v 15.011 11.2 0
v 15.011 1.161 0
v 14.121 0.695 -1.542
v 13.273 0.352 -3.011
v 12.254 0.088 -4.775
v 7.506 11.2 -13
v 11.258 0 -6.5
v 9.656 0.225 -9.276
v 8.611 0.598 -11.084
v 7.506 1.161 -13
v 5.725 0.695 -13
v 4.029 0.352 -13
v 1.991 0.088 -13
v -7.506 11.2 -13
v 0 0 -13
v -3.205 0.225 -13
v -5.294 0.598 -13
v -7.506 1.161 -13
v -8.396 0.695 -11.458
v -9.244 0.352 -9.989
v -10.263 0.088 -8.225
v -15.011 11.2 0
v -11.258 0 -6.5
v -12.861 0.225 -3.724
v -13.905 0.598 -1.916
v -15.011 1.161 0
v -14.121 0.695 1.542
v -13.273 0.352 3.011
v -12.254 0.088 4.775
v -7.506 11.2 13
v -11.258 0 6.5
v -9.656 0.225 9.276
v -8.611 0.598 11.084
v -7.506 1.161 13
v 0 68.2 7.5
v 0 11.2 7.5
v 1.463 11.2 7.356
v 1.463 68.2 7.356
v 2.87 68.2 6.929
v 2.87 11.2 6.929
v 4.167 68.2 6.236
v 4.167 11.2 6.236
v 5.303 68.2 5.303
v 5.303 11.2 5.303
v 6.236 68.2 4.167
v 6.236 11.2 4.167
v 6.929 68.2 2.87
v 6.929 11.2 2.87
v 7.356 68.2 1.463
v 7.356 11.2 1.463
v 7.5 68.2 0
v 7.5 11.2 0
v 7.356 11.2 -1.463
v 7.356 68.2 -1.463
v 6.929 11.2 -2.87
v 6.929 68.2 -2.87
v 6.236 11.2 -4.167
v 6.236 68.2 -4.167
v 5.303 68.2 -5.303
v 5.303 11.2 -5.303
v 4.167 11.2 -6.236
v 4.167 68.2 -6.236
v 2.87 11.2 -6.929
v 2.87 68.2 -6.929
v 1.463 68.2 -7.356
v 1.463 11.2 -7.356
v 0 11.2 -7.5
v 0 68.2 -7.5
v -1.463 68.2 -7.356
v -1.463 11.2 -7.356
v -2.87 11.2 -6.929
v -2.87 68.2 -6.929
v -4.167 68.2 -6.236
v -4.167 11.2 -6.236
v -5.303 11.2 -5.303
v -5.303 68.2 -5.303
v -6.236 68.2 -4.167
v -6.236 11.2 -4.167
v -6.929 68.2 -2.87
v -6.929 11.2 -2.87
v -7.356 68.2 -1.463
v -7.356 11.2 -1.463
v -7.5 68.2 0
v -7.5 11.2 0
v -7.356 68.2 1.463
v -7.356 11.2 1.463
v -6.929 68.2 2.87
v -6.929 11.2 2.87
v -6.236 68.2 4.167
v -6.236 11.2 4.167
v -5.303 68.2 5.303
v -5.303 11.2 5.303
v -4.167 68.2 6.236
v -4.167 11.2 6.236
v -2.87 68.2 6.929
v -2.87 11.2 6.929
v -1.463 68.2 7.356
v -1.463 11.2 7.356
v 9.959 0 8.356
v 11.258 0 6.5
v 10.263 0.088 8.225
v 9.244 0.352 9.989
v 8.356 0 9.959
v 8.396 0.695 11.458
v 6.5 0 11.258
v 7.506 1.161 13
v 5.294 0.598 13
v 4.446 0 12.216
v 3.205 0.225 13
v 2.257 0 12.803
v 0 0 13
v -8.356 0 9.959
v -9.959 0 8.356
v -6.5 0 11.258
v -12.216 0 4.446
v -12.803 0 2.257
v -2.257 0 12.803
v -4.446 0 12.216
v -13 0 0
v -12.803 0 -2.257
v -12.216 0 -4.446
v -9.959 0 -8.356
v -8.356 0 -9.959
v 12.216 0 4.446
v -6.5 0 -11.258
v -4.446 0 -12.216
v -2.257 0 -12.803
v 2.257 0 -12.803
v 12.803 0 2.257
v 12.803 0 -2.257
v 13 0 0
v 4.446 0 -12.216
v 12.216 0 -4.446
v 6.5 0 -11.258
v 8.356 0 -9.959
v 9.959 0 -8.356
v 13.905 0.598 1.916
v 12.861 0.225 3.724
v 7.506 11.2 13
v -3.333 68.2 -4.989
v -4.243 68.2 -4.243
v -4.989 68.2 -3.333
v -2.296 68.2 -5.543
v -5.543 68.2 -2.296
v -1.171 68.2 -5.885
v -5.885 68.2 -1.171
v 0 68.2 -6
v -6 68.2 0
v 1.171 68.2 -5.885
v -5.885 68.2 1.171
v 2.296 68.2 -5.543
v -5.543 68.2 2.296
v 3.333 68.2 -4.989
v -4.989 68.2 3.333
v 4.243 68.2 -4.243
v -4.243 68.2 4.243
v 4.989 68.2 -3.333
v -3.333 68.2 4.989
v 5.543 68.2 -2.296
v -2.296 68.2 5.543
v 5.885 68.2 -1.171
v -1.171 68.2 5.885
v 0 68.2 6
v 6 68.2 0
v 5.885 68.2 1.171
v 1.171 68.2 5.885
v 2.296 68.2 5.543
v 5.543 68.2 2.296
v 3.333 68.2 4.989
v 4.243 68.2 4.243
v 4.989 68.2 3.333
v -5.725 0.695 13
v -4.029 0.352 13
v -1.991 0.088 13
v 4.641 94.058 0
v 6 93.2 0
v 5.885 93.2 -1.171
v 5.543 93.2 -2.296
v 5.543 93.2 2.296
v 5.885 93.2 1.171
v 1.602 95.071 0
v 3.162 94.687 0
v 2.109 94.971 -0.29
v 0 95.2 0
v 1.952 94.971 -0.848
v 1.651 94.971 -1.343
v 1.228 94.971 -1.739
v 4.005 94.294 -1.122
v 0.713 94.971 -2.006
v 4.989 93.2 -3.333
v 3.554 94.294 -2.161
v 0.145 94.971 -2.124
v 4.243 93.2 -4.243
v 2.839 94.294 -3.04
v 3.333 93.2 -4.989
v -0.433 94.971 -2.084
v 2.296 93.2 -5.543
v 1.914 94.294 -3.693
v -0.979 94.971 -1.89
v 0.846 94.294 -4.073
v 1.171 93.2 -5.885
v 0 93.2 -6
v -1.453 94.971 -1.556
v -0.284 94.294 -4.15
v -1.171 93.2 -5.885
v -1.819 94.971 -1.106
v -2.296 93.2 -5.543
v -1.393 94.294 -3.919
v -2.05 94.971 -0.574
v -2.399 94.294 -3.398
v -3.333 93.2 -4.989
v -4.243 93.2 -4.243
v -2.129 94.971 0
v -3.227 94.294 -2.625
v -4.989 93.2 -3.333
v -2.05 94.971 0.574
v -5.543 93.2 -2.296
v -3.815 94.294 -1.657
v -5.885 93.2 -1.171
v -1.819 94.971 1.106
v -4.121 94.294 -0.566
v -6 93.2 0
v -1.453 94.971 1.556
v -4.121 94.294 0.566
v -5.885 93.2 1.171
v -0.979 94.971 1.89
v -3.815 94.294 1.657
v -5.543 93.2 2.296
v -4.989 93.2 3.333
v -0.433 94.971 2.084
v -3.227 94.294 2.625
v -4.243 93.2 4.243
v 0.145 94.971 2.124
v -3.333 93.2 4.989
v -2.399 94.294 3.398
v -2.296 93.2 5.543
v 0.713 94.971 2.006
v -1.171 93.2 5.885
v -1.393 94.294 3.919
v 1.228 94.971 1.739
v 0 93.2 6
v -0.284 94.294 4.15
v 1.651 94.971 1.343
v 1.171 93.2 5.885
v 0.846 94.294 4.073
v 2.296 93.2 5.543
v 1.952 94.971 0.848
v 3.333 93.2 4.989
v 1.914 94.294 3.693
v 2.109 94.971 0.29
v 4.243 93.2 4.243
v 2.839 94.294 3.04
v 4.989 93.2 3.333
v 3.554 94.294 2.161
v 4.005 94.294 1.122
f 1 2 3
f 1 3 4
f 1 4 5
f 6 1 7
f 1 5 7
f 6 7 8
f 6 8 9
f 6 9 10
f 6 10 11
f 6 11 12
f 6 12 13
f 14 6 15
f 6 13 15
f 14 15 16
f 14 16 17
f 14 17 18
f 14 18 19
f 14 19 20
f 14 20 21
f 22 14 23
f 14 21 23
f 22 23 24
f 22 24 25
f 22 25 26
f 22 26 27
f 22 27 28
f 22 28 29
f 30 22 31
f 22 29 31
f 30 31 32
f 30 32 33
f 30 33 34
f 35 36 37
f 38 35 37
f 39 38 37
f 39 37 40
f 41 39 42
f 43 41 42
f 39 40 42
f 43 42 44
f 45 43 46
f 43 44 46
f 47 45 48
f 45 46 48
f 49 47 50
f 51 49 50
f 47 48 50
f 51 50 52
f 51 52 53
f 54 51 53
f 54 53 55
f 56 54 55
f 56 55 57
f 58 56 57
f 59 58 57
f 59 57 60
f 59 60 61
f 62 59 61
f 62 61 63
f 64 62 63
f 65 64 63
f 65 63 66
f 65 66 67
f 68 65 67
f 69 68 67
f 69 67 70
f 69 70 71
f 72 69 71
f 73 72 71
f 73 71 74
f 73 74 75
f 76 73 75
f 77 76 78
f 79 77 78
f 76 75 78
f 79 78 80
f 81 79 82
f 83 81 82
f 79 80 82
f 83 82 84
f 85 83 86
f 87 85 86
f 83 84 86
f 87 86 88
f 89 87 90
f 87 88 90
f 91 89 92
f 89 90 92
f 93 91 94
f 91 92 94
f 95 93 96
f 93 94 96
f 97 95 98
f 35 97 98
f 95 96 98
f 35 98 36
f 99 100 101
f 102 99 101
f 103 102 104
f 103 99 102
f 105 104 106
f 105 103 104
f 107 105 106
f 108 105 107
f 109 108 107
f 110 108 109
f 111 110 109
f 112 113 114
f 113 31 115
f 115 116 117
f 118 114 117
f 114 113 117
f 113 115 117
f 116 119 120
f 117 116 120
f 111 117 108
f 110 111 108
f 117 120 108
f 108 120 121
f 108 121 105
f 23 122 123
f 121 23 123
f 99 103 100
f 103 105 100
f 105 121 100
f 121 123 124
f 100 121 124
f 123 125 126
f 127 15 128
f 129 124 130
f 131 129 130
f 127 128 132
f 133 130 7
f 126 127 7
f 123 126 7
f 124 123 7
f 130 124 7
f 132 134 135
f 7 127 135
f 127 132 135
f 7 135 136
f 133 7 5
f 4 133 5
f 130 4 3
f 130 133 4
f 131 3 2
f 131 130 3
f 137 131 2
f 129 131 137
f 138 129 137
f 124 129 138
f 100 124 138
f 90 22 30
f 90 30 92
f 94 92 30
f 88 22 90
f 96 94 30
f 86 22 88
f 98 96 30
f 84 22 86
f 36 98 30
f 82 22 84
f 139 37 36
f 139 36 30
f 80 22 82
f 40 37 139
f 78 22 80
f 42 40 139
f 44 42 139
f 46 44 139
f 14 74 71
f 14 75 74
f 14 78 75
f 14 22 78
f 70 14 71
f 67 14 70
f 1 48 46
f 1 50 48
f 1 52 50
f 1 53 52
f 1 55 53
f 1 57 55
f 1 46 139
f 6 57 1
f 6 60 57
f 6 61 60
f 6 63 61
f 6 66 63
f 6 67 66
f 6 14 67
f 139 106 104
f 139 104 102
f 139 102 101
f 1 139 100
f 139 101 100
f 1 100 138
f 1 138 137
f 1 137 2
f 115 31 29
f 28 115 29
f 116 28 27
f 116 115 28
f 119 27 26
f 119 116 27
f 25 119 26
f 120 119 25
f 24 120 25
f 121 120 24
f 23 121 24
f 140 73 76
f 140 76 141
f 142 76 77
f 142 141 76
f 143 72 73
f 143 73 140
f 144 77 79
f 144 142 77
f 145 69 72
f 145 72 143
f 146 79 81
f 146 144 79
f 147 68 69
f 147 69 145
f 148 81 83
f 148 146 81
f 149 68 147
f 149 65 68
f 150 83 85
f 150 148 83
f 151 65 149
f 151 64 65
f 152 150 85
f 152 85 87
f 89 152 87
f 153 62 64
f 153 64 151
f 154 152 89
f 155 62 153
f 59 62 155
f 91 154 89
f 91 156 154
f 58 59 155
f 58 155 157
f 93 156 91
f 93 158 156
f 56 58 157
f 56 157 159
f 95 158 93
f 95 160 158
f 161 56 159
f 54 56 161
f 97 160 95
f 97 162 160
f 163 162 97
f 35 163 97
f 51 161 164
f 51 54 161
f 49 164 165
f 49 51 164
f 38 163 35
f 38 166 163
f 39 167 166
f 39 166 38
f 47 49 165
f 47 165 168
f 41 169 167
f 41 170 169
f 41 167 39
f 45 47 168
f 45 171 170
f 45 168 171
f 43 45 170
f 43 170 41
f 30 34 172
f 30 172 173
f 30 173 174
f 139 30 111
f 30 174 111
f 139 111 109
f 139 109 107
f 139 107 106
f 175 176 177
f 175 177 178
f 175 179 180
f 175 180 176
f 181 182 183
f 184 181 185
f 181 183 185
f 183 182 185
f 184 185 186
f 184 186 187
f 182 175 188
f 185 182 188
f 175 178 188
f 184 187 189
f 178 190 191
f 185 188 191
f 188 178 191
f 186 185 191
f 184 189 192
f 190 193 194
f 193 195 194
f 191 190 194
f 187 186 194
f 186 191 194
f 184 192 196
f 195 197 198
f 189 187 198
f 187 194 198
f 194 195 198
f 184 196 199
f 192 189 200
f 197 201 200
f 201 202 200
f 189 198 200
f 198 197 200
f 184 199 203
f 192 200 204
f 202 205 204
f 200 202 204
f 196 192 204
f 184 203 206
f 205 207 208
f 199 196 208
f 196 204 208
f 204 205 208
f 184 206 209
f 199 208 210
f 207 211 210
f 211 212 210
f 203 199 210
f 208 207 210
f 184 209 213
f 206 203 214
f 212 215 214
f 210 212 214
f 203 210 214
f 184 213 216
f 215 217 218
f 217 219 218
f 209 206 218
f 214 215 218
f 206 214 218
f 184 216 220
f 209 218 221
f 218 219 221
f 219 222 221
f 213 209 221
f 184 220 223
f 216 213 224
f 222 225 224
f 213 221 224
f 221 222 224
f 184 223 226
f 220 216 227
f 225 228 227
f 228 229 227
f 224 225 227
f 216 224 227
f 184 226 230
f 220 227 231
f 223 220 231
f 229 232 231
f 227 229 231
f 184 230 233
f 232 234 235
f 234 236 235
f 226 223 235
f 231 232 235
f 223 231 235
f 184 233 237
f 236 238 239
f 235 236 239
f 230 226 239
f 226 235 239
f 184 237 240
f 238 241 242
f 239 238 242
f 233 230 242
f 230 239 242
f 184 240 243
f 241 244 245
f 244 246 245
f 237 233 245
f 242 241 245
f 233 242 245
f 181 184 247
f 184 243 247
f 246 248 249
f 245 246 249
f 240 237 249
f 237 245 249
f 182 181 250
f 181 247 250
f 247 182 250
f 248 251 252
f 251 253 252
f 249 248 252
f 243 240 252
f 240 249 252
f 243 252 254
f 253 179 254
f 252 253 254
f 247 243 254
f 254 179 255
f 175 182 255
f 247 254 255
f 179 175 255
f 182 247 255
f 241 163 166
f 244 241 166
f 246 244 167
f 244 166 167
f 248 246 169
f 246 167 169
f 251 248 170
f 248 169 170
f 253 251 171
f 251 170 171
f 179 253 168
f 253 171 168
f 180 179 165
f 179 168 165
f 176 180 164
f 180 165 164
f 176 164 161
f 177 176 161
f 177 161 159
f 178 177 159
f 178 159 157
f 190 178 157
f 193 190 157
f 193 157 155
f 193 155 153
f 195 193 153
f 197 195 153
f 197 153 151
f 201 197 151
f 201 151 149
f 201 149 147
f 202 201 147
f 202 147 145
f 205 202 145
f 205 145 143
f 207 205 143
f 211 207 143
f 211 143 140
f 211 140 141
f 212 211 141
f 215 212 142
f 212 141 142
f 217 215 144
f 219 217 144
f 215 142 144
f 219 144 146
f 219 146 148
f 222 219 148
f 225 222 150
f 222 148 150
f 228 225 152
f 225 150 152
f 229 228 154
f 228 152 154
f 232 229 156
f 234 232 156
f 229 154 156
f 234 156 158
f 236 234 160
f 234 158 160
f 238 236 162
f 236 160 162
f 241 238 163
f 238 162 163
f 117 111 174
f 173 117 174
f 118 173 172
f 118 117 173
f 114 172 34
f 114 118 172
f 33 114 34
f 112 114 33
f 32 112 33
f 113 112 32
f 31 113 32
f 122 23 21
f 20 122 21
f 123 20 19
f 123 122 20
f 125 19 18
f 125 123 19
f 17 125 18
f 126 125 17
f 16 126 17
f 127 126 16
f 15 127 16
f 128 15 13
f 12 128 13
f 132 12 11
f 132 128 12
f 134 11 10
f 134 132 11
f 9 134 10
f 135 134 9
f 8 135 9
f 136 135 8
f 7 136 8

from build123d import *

# Parameters (mm, degrees)
SKETCH1_R           = 7.5
BOSS_EXTRUDE1_DEPTH = 11.2
SKETCH1_3_R         = 7.5
SKETCH1_3_R_2       = 6
BOSS_EXTRUDE2_DEPTH = 68.2
SKETCH1_4_R         = 6
BOSS_EXTRUDE3_DEPTH = 93.2
SKETCH4_OUTSIDE_W   = 338.072
SKETCH4_OUTSIDE_H   = 334.05
SKETCH4_OUTSIDE_R   = 13
CUT_EXTRUDE1_DEPTH  = 82.5
CUT_EXTRUDE1_DRAFT  = -60


with BuildPart() as part:
    # Sketch1 → Boss-Extrude1 (new body)
    with BuildSketch(Plane(origin=(0, 0, 0), x_dir=(1, 0, 0), z_dir=(0, 1, 0))):
        Polygon((15.011106999, 0), (7.505553499, 13), (-7.505553499, 13), (-15.011106999, 0), (-7.505553499, -13), (7.505553499, -13), align=None)
        with Locations(Location((0, 0, 0), (0, 0, 270))):
            Circle(SKETCH1_R, mode=Mode.SUBTRACT)
    extrude(amount=BOSS_EXTRUDE1_DEPTH)

    # Sketch1<3> → Boss-Extrude2 (add)
    with BuildSketch(Plane(origin=(0, 0, 0), x_dir=(1, 0, 0), z_dir=(0, 1, 0))):
        with Locations(Location((0, 0, 0), (0, 0, 270))):
            Circle(SKETCH1_3_R)
        with Locations(Location((0, 0, 0), (0, 0, 270))):
            Circle(SKETCH1_3_R_2, mode=Mode.SUBTRACT)
    extrude(amount=BOSS_EXTRUDE2_DEPTH)

    # Sketch1<4> → Boss-Extrude3 (add)
    with BuildSketch(Plane(origin=(0, 0, 0), x_dir=(1, 0, 0), z_dir=(0, 1, 0))):
        with Locations(Location((0, 0, 0), (0, 0, 270))):
            Circle(SKETCH1_4_R)
    extrude(amount=BOSS_EXTRUDE3_DEPTH)


with BuildPart() as cut_extrude1_tool:
    # Sketch4 outside → Cut-Extrude1 (with draft: the straight prism first)
    with BuildSketch(Plane.XZ):
        Rectangle(SKETCH4_OUTSIDE_W, SKETCH4_OUTSIDE_H)
        Circle(SKETCH4_OUTSIDE_R, mode=Mode.SUBTRACT)
    extrude(amount=-CUT_EXTRUDE1_DEPTH)
    # Cut-Extrude1: the draft: its side faces are tilted about the plane it starts from
    cut_extrude1_sides = [cut_extrude1_tool.faces().sort_by_distance(p)[0] for p in [
        (0, 41.25, -167.025),
        (169.036, 41.25, 0),
        (0, 41.25, 167.025),
        (-169.036, 41.25, 0),
        (-13, 41.25, 0),
    ]]
    draft(cut_extrude1_sides, Plane.XZ, CUT_EXTRUDE1_DRAFT)


with BuildPart() as part_1:
    add(part.part)

    # Cut-Extrude1: cut by cut_extrude1_tool
    add(cut_extrude1_tool.part, mode=Mode.SUBTRACT)

    # Sketch2 → Revolve2 (revolve)
    with BuildSketch(Plane.XY, mode=Mode.PRIVATE) as revolve2_sk:
        with BuildLine():
            Line((-6, 93.2), (0, 93.2))
            Line((0, 93.2), (0, 95.2))
            ThreePointArc((0, 95.2), (-3.16227766, 94.686832981), (-6, 93.2))
        make_face()
    revolve(revolve2_sk.sketch.rotate(Axis((0, 93.2, 0), (0, 1, 0)), 180), axis=Axis((0, 93.2, 0), (0, 1, 0)))


solid = part_1.part
